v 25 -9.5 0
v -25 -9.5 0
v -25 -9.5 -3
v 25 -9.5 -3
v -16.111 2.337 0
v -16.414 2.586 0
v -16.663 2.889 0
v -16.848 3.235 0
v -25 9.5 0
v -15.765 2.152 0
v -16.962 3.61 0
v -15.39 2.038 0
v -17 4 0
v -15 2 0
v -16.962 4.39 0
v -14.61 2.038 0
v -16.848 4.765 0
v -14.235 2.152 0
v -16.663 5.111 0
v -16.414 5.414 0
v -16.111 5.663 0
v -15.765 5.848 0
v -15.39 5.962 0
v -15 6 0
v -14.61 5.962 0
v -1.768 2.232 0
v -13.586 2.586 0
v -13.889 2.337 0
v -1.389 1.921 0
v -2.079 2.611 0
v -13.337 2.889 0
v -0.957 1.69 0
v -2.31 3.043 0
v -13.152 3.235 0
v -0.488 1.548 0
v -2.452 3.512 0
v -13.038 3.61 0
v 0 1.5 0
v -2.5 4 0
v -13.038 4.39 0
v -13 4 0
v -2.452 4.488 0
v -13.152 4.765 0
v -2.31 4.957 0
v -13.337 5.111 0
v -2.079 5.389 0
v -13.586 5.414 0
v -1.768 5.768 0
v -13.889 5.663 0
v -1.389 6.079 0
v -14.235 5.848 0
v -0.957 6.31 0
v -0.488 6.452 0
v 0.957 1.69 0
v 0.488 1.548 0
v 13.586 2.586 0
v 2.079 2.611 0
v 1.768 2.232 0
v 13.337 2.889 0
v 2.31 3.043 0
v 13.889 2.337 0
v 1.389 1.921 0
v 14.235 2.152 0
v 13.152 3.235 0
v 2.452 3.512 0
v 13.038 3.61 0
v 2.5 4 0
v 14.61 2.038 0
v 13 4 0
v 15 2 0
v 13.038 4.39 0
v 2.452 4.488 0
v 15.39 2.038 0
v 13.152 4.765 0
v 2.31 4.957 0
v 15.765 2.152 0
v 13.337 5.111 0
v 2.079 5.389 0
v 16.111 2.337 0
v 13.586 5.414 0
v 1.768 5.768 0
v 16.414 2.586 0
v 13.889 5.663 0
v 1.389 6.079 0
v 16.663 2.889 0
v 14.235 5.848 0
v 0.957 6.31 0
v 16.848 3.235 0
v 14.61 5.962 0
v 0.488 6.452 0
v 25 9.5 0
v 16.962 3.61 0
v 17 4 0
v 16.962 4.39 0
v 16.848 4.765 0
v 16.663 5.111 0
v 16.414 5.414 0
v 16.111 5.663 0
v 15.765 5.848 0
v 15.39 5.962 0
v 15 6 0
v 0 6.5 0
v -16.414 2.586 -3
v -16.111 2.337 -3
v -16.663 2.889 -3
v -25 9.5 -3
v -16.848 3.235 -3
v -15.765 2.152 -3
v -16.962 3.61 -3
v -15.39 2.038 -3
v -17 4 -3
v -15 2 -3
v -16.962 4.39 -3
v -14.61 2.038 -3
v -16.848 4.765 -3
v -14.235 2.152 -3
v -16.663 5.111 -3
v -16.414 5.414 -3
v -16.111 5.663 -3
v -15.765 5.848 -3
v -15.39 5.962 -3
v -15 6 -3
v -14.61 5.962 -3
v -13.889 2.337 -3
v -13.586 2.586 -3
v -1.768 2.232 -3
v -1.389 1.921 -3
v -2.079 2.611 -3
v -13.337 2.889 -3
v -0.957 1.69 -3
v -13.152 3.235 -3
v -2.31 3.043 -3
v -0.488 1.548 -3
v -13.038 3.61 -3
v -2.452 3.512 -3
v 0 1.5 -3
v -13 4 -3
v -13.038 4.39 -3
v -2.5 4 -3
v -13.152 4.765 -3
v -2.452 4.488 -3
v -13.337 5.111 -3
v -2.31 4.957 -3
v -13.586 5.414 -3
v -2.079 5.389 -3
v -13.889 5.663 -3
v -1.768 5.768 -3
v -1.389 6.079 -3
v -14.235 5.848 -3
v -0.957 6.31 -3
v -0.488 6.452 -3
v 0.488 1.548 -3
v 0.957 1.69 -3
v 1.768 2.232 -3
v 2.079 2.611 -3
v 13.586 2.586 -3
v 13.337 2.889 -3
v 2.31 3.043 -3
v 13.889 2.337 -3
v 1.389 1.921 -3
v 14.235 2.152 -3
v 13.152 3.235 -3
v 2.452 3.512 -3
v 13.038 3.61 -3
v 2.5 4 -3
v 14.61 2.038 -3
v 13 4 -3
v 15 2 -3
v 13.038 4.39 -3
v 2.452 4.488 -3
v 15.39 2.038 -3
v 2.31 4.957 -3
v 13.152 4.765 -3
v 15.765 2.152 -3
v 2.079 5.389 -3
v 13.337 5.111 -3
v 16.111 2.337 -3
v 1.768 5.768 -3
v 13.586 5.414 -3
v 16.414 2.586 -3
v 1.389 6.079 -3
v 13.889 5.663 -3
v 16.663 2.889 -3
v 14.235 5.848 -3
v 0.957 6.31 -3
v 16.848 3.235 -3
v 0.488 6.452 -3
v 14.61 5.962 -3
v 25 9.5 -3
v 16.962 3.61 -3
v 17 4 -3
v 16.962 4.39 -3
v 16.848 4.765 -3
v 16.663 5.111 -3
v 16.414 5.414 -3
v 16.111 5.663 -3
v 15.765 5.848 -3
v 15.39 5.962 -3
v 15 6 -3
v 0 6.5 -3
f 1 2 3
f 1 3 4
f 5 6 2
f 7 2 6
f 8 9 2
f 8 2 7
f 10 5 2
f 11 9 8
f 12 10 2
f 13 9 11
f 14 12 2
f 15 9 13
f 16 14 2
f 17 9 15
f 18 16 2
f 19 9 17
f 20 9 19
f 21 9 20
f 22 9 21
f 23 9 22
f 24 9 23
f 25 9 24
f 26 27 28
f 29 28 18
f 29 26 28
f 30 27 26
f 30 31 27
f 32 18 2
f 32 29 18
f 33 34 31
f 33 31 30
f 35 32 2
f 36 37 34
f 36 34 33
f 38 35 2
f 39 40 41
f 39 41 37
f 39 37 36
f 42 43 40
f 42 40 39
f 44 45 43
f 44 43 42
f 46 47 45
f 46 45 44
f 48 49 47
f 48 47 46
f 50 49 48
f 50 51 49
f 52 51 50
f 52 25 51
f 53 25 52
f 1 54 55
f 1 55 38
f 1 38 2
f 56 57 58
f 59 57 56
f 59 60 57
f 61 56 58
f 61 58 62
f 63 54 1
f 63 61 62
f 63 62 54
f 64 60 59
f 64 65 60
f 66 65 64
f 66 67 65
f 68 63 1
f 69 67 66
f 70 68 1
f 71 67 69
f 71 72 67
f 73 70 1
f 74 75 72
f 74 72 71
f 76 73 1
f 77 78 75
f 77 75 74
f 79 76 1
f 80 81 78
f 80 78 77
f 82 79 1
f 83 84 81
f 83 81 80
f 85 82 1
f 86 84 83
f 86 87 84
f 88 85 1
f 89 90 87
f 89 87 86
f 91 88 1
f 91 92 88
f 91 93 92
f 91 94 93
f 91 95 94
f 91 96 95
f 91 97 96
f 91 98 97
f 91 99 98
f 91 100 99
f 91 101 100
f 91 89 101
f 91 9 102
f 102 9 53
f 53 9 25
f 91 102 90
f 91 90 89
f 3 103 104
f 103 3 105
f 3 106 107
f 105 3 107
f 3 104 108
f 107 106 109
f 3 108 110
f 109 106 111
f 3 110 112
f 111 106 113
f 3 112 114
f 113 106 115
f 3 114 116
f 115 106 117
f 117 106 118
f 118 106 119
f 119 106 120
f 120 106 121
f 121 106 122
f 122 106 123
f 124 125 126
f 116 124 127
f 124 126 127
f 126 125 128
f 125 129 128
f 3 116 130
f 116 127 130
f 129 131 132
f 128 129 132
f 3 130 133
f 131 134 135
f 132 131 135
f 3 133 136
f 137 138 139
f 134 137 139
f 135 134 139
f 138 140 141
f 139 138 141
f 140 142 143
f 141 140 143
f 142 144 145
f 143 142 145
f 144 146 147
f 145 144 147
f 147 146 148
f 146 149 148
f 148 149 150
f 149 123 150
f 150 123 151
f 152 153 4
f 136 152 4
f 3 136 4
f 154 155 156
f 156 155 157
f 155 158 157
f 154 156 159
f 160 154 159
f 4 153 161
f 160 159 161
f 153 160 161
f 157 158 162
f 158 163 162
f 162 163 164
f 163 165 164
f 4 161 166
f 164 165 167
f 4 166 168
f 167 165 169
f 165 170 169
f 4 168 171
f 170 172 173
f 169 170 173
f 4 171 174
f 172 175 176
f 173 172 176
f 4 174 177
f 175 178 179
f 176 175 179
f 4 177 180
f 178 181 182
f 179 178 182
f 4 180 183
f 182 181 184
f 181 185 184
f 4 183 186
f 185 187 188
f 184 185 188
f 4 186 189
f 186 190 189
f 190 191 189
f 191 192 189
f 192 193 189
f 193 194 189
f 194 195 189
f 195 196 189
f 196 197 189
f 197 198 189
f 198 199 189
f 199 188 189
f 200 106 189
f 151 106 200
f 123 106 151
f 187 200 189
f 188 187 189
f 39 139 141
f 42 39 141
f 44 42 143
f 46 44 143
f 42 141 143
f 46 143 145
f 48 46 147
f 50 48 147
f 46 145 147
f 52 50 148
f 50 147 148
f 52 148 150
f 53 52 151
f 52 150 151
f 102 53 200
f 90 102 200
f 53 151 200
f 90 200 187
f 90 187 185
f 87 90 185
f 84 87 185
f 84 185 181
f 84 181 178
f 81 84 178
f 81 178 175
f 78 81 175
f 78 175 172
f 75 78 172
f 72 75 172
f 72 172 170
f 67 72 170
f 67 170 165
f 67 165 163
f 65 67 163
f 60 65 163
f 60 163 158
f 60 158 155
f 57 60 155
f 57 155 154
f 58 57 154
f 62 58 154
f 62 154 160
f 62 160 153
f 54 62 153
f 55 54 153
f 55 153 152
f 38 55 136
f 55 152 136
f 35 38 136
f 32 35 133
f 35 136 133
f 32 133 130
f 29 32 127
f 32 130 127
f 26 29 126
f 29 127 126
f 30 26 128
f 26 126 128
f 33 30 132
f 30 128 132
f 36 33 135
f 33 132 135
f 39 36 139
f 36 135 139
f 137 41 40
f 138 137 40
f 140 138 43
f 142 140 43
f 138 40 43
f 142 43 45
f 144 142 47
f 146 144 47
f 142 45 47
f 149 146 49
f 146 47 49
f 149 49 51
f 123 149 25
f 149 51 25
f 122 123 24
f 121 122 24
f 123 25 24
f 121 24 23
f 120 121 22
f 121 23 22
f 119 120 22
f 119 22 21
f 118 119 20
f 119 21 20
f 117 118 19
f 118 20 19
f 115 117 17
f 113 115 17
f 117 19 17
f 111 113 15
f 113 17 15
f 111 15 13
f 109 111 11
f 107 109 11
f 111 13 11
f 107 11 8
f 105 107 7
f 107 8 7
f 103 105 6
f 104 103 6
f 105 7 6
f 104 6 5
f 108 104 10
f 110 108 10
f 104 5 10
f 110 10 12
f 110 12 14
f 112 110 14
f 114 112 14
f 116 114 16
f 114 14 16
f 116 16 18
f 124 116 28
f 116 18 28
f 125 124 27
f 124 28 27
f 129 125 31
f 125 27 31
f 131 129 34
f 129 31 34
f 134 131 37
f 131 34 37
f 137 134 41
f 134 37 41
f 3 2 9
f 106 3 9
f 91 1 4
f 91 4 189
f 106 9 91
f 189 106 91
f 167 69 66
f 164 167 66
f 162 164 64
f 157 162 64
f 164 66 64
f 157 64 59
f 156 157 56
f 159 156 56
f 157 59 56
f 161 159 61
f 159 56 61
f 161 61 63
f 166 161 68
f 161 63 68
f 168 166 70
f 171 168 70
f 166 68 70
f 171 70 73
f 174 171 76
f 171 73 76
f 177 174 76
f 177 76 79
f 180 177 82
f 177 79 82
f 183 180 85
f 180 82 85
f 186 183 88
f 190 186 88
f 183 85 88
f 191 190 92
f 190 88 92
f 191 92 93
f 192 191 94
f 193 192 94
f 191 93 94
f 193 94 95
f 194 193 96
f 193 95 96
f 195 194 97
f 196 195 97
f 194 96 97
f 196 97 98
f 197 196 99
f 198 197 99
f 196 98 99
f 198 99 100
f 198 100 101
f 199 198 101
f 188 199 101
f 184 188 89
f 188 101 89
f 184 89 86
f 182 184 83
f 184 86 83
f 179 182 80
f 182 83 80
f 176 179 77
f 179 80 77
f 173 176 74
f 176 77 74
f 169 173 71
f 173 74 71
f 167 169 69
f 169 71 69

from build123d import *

# Parameters (mm, degrees)
SKETCH_1_W             = 50
SKETCH_1_H             = 19
SKETCH_1_R             = 2
SM_BASE_FLANGE_1_DEPTH = 3
HOLE_WIZARD_M6_1_D     = 5


# Sheet-metal steps are written as plain solids
with BuildPart() as part:
    # Sketch 1 → 基体-法兰1 (new body)
    with BuildSketch(Plane.XY):
        Rectangle(SKETCH_1_W, SKETCH_1_H)
        with Locations((-15, 4)):
            Circle(SKETCH_1_R, mode=Mode.SUBTRACT)
        with Locations(Location((15, 4, 0), (0, 0, 180))):
            Circle(SKETCH_1_R, mode=Mode.SUBTRACT)
    extrude(amount=-SM_BASE_FLANGE_1_DEPTH)

    # M6 螺纹孔1 (through all)
    with Locations(Plane.XY):
        with Locations((0, 4)):
            Hole(HOLE_WIZARD_M6_1_D / 2)


solid = part.part
